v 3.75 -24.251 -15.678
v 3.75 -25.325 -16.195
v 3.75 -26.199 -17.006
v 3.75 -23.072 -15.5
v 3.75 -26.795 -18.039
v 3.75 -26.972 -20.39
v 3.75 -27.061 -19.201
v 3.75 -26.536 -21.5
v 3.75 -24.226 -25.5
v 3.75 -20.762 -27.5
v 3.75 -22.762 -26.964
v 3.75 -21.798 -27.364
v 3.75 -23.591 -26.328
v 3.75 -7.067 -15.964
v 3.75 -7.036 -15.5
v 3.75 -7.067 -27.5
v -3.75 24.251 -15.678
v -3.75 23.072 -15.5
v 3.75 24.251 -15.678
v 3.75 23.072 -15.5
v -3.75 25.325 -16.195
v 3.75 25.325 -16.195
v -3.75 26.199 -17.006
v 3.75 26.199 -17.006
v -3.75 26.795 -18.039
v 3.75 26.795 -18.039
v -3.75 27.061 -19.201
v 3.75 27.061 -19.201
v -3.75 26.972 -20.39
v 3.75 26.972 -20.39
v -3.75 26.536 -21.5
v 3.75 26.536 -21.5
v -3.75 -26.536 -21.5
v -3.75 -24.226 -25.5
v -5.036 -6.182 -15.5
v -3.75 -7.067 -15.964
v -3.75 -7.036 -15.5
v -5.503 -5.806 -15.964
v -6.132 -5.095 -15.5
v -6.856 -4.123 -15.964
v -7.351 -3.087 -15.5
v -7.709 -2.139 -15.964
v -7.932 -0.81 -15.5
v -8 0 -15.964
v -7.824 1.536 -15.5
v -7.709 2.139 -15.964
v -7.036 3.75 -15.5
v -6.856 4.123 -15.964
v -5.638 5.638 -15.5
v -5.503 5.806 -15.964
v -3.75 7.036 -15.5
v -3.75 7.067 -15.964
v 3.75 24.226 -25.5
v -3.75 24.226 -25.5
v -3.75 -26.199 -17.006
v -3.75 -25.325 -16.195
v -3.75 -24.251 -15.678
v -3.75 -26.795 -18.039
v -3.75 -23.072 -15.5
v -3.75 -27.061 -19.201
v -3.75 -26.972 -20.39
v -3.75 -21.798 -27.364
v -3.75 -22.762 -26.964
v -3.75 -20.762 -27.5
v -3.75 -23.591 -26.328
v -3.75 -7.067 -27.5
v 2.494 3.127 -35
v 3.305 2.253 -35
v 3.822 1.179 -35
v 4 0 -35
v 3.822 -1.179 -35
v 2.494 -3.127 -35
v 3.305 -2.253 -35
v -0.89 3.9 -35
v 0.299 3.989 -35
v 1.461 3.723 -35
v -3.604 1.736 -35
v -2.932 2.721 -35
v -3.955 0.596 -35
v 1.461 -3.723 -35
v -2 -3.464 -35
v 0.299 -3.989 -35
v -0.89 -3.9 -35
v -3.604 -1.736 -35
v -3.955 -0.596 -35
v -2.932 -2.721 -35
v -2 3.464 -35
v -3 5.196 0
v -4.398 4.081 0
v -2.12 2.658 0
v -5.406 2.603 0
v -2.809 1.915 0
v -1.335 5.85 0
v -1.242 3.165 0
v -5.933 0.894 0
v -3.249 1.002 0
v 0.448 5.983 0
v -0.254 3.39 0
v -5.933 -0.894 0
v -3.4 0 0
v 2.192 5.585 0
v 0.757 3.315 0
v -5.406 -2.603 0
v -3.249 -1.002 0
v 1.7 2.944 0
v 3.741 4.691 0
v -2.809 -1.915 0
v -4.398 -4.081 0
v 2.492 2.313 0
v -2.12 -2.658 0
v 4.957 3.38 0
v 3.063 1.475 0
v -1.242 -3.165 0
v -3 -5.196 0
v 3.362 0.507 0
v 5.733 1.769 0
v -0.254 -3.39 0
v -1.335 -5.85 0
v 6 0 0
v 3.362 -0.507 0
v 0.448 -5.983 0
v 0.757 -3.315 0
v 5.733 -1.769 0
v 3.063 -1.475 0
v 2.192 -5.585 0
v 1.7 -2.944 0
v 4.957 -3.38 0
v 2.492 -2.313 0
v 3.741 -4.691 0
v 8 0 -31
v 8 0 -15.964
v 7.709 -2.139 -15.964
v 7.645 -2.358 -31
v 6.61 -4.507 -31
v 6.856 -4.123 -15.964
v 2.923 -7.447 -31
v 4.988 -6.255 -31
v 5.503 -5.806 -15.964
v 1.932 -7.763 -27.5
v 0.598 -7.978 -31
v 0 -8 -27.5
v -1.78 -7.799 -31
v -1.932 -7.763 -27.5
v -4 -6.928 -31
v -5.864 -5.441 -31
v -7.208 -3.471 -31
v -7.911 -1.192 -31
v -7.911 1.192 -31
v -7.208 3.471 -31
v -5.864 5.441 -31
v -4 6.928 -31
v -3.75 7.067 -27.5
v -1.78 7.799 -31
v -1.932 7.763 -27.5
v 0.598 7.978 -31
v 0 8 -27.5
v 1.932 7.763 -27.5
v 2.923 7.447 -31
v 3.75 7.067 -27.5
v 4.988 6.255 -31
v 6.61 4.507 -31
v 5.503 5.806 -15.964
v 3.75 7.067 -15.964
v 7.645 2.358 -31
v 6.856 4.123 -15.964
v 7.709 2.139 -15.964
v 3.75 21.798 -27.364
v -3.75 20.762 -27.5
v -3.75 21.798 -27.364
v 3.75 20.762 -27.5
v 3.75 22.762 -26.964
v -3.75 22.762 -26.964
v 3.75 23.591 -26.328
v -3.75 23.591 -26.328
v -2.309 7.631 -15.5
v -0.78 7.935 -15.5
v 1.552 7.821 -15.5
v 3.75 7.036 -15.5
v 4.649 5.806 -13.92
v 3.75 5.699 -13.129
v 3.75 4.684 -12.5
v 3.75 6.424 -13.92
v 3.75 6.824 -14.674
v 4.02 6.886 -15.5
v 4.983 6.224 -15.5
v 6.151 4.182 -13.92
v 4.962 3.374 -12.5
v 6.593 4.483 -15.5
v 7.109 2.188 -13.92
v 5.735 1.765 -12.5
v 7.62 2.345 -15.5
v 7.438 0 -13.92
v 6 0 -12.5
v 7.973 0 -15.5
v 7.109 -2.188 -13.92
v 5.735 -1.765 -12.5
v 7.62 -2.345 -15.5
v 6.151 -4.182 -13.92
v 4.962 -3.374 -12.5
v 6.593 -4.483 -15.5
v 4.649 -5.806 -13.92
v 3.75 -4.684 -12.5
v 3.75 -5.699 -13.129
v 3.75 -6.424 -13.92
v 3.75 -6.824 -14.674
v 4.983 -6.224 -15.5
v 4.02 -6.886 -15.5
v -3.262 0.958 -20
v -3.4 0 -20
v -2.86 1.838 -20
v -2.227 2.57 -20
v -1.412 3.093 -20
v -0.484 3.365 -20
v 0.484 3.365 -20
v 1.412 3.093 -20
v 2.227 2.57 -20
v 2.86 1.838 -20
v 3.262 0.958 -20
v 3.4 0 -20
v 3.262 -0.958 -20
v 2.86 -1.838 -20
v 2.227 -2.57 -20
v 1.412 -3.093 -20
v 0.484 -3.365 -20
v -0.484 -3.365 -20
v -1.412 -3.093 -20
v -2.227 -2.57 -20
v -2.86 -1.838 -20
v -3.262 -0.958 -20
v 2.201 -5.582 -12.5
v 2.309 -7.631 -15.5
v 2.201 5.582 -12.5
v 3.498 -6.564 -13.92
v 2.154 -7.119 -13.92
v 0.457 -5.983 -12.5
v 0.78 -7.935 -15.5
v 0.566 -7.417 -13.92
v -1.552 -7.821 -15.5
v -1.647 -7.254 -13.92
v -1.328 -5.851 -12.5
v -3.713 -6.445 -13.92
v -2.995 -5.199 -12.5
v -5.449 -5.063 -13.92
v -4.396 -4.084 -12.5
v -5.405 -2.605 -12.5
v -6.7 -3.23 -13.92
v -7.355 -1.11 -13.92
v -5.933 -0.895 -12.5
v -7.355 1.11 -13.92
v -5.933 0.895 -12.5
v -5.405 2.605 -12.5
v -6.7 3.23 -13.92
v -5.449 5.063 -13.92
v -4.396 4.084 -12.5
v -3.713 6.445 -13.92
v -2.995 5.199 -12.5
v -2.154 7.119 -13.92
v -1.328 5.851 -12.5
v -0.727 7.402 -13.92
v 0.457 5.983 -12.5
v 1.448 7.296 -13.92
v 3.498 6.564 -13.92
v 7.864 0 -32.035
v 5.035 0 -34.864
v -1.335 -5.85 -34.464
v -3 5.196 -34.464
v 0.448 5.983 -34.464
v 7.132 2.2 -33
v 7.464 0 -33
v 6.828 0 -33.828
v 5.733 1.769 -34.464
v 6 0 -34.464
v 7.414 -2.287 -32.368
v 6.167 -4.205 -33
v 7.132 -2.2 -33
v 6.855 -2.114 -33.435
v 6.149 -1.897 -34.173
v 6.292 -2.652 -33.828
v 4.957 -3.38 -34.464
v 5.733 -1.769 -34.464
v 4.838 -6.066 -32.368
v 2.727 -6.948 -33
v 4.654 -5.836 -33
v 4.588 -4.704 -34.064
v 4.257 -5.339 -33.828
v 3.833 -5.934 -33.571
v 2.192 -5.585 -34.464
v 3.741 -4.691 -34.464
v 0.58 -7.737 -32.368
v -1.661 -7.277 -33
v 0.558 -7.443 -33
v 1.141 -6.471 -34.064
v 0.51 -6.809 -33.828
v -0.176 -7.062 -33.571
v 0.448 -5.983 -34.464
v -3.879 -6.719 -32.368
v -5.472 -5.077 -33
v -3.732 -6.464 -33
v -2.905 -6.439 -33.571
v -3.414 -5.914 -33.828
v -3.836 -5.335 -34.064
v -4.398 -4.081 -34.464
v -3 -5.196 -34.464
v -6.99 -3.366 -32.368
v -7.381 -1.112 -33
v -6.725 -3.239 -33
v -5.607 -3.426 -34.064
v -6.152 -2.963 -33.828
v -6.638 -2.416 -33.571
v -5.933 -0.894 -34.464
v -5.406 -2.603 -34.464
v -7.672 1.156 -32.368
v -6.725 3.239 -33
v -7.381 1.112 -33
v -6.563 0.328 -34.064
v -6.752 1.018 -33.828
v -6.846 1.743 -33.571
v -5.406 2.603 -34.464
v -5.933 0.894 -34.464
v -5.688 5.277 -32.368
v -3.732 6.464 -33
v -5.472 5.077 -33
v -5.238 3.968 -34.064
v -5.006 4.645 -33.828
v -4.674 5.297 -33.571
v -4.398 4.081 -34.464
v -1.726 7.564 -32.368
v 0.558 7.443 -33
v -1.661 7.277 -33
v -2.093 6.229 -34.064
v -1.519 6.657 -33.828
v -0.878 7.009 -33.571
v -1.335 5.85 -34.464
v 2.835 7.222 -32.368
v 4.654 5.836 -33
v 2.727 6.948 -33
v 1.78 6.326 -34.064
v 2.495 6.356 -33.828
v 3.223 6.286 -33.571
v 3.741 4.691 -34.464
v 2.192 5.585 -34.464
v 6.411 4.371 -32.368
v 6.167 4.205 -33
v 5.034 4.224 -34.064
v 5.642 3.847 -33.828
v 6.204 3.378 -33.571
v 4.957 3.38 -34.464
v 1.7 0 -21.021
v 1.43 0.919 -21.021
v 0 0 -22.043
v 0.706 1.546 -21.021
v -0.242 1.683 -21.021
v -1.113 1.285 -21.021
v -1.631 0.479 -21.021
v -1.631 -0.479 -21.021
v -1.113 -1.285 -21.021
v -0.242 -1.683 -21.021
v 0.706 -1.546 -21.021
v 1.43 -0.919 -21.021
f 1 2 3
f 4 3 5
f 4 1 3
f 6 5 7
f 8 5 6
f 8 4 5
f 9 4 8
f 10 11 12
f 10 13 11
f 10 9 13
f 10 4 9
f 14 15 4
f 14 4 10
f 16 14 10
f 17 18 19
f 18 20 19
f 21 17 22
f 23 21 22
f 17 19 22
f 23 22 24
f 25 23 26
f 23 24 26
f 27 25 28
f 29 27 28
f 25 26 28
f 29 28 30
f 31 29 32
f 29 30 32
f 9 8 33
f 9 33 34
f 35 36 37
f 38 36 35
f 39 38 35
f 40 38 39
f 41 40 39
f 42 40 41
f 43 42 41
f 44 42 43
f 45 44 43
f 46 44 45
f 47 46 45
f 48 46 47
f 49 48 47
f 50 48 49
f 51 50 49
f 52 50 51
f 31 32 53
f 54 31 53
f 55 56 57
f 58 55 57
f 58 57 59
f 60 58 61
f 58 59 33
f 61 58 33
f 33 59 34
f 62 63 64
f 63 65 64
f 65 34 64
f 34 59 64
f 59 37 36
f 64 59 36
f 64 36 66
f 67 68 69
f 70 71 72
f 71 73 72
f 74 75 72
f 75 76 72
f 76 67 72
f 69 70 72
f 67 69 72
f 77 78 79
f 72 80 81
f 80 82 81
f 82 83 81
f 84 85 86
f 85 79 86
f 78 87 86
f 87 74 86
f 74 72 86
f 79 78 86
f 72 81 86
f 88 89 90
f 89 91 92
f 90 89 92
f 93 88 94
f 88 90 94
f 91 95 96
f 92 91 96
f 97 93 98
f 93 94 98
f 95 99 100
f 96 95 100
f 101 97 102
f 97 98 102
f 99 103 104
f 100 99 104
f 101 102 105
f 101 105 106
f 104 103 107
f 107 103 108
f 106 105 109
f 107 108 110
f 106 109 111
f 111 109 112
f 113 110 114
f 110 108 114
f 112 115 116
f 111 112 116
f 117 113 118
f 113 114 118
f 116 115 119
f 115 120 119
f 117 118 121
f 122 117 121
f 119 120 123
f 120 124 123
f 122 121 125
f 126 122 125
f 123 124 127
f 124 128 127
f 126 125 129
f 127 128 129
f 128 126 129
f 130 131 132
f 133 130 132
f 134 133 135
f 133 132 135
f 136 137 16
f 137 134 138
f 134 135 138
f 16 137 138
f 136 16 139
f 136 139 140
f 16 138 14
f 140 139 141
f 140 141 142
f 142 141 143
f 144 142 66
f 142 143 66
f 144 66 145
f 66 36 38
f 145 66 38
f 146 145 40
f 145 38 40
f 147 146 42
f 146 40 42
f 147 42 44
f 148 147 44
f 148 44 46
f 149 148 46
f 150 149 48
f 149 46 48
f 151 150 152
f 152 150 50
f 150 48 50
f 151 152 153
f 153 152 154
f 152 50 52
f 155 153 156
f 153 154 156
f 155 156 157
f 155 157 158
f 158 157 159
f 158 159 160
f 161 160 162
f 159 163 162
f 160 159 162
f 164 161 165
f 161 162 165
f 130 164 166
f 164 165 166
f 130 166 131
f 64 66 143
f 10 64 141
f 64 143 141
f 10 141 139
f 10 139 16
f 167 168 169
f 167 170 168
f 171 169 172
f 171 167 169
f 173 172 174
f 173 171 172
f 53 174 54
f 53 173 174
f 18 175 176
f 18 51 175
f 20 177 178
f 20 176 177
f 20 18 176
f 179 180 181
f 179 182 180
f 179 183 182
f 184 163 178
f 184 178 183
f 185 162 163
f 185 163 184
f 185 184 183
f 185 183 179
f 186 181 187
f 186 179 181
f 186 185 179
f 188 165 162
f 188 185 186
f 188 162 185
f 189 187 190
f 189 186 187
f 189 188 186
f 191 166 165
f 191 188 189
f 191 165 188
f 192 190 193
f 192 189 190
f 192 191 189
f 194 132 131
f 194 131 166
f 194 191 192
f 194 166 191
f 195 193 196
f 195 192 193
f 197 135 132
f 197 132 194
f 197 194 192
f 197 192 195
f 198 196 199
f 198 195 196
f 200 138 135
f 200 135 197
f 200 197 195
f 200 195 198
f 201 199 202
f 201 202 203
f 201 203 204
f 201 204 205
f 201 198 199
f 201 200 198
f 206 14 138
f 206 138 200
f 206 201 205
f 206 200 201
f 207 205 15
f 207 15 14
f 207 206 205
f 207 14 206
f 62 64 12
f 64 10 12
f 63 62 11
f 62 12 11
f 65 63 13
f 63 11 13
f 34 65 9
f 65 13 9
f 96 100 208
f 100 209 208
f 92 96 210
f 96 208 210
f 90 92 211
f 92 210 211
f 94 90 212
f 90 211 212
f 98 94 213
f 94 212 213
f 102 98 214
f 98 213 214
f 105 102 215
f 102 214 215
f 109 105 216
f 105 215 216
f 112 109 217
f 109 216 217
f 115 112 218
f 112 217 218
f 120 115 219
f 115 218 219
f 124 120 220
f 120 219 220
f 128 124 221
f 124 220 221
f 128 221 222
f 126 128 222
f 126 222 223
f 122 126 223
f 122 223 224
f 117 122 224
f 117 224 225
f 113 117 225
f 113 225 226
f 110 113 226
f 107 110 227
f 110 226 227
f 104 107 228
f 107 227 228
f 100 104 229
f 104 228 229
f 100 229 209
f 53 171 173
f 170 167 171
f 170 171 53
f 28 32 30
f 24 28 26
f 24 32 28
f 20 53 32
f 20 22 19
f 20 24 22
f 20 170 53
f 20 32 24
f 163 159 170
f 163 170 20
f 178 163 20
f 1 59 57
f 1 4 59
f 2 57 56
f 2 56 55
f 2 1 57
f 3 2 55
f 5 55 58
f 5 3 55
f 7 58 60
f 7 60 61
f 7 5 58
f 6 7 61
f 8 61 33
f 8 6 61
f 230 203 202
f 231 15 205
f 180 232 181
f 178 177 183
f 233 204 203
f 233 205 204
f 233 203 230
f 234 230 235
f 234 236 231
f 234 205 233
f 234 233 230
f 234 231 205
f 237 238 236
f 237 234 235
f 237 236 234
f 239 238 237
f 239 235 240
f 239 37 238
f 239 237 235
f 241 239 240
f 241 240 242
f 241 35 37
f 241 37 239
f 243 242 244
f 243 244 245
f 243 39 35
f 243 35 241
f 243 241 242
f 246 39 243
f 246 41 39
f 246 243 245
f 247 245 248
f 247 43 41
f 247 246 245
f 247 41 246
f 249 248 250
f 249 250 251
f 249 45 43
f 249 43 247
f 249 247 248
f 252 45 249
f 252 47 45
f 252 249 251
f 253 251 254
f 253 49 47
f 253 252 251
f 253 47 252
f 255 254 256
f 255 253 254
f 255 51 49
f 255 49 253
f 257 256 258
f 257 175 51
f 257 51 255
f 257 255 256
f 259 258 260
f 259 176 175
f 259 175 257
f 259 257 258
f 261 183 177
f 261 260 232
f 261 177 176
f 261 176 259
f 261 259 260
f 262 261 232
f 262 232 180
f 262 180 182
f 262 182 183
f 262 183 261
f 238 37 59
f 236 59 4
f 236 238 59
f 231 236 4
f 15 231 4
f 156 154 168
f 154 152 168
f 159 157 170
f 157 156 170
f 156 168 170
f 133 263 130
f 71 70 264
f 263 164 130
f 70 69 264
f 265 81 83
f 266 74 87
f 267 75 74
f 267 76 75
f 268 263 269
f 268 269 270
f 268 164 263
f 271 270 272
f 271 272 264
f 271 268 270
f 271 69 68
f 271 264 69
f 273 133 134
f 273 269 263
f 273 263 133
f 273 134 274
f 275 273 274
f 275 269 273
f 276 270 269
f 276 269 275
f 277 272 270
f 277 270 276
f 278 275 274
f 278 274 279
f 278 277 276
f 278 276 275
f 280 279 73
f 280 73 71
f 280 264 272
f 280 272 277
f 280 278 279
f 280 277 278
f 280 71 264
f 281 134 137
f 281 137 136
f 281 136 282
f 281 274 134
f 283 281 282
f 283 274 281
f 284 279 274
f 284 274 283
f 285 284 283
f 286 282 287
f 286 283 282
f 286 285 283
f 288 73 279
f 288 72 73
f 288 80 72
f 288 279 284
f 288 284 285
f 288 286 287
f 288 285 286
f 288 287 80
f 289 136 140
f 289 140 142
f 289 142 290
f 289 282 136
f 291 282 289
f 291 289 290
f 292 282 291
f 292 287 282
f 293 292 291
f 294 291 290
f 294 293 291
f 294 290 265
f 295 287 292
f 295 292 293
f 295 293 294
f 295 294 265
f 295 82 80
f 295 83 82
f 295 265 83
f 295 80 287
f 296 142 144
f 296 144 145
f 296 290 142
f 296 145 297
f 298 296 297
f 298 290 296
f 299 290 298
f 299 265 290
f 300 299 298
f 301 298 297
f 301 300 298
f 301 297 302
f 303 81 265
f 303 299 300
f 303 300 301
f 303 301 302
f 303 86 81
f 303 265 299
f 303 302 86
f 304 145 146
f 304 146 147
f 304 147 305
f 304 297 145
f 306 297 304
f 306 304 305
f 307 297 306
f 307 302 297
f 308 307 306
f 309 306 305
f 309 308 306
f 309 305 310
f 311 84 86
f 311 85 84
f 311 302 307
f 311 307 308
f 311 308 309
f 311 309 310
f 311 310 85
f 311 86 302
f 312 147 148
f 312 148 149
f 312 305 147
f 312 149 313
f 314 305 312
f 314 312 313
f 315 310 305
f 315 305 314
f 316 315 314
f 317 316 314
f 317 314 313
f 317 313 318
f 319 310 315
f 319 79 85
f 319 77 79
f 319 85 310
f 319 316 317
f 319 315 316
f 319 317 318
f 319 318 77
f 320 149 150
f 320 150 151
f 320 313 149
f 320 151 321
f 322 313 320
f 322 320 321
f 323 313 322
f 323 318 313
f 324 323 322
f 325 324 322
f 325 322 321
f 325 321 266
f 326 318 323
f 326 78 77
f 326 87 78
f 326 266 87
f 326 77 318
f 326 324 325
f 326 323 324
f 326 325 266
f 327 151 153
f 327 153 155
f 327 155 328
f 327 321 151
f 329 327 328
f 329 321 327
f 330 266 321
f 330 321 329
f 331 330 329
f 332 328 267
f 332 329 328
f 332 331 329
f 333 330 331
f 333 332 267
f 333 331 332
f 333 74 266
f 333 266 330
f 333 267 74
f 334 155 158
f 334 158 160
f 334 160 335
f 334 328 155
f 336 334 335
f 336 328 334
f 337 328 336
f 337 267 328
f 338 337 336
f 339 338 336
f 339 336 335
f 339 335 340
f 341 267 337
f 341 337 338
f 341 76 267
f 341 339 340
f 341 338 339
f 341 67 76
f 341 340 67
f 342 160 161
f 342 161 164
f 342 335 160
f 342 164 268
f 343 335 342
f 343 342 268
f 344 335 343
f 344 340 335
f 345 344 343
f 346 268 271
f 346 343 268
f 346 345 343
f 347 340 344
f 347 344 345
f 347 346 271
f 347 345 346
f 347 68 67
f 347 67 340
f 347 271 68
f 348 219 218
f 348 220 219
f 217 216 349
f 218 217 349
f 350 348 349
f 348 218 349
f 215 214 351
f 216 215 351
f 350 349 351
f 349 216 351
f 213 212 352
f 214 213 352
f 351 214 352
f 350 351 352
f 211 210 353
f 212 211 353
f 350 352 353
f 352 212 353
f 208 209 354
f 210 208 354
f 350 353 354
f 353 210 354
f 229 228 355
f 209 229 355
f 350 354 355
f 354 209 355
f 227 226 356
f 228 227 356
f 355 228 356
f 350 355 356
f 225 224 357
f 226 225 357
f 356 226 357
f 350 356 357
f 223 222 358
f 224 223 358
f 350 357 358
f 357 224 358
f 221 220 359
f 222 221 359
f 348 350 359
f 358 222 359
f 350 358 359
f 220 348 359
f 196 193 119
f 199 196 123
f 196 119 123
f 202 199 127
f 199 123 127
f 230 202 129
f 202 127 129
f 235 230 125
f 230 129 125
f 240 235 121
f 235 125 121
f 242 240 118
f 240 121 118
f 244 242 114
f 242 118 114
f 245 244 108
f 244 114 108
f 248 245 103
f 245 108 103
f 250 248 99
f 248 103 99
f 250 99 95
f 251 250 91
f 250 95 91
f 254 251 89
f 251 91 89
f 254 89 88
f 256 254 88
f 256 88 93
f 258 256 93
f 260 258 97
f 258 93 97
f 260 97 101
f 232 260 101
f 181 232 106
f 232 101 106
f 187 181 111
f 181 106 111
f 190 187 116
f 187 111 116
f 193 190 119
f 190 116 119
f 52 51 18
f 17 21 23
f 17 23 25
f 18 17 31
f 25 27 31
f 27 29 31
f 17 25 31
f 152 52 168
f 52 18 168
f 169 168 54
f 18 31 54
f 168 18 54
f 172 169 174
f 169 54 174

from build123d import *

# Parameters (mm, degrees)
SKETCH4_W               = 7.5
SKETCH4_H               = 12
BOSS_EXTRUDE2_DEPTH     = 30
CUT_EXTRUDE1_DEPTH      = 48.571656477
CUT_EXTRUDE1_DEPTH_BACK = 48.571656477
CUT_EXTRUDE2_DEPTH      = 48.571656477
CUT_EXTRUDE2_DEPTH_BACK = 48.571656477
M8_TAPPED_HOLE2_D       = 6.8
M8_TAPPED_HOLE2_DEPTH   = 20
M8_TAPPED_HOLE2_TIP     = 2.042926105
FILLET1_R               = 4
FILLET2_R               = 4


with BuildPart() as part:
    # Sketch2 → Revolve1 (revolve)
    with BuildSketch(Plane(origin=(0, 0, 0), x_dir=(1, 0, 0), z_dir=(0, 1, 0)), mode=Mode.PRIVATE) as revolve1_sk:
        Polygon((-6, 0), (0, 0), (0, 35), (-8, 35), (-8, 27.5), (-8, 15.5), (-8, 12.5), (-6, 12.5), align=None)
    revolve(revolve1_sk.sketch.rotate(Axis((0, 0, 0), (0, 0, -1)), 180), axis=Axis((0, 0, 0), (0, 0, -1)))

    # Sketch4 → Boss-Extrude2 (add, symmetric)
    with BuildSketch(Plane(origin=(0, 0, 0), x_dir=(1, 0, 0), z_dir=(0, 1, 0))):
        with Locations((0, 21.5)):
            Rectangle(SKETCH4_W, SKETCH4_H)
    extrude(amount=BOSS_EXTRUDE2_DEPTH, both=True)

    # Sketch5 → Cut-Extrude1 (cut, two sides: drawn at the far end of the back side and taken through both)
    with BuildSketch(Plane(origin=(3.75, 0, 0), x_dir=(0, 0, -1), z_dir=(1, 0, 0)).offset(-CUT_EXTRUDE1_DEPTH_BACK)):
        Polygon((15.5, 30), (27.5, 23.07179677), (27.5, 30), align=None)
    extrude(amount=CUT_EXTRUDE1_DEPTH + CUT_EXTRUDE1_DEPTH_BACK, mode=Mode.SUBTRACT)

    # Sketch6 → Cut-Extrude2 (cut, two sides: drawn at the far end of the back side and taken through both)
    with BuildSketch(Plane(origin=(3.75, 0, 0), x_dir=(0, 0, -1), z_dir=(1, 0, 0)).offset(-CUT_EXTRUDE2_DEPTH_BACK)):
        Polygon((15.5, -30), (27.5, -23.07179677), (27.5, -30), align=None)
    extrude(amount=CUT_EXTRUDE2_DEPTH + CUT_EXTRUDE2_DEPTH_BACK, mode=Mode.SUBTRACT)

    # M8 Tapped Hole2
    with Locations(Plane.XY):
        with Locations((0, 0)):
            Hole(M8_TAPPED_HOLE2_D / 2, depth=M8_TAPPED_HOLE2_DEPTH)
            with Locations((0, 0, -(M8_TAPPED_HOLE2_DEPTH + M8_TAPPED_HOLE2_TIP / 2))):  # 118° drill point
                Cone(0, M8_TAPPED_HOLE2_D / 2, M8_TAPPED_HOLE2_TIP, mode=Mode.SUBTRACT)

    # Fillet1
    fillet1_edges = [part.edges().sort_by_distance(p)[0] for p in [
        (0, -30, -15.5),
        (0, 30, -15.5),
        (0, 23.07179677, -27.5),
        (0, -23.07179677, -27.5),
    ]]
    fillet(fillet1_edges, radius=FILLET1_R)

    # Fillet2
    # the kernel refuses this fillet: 4 mm, written as the material it takes off along each edge
    with BuildSketch(Plane(origin=(0, 0, -35), x_dir=(1, 0, 0), z_dir=(0, 1, 0))) as fillet2_piece_1:
        with BuildLine():
            CenterArc((8 - FILLET2_R, -FILLET2_R), FILLET2_R, 0, 90)
            Line((8 - FILLET2_R, 0), (8, 0))
            Line((8, 0), (8, -FILLET2_R))
        make_face()
    revolve(axis=Axis((0, 0, -35), (0, 0, -1)), mode=Mode.SUBTRACT)
    with BuildSketch(Plane(origin=(0, 0, -12.5), x_dir=(1, 0, 0), z_dir=(0, 1, 0))) as fillet2_piece_2_section:
        with BuildLine():
            CenterArc((4, 3.464101615), FILLET2_R, 300, 60)
            Line((6, 0), (8, 0))
            Line((8, 0), (8, 3.464101615))
        make_face()
    fillet2_piece_2 = revolve(axis=Axis((0, 0, -12.5), (0, 0, -1)), mode=Mode.PRIVATE)
    fillet2_piece_2 = split(fillet2_piece_2, bisect_by=Plane(origin=(3.75, -4.120033491, -15.73161152), z_dir=(1, 0, 0)), keep=Keep.TOP, mode=Mode.PRIVATE)
    add(fillet2_piece_2, mode=Mode.SUBTRACT)
    with BuildSketch(Plane(origin=(0, 0, -12.5), x_dir=(1, 0, 0), z_dir=(0, 1, 0))) as fillet2_piece_3_section:
        with BuildLine():
            CenterArc((4, 3.464101615), FILLET2_R, 300, 60)
            Line((6, 0), (8, 0))
            Line((8, 0), (8, 3.464101615))
        make_face()
    fillet2_piece_3 = revolve(axis=Axis((0, 0, -12.5), (0, 0, -1)), mode=Mode.PRIVATE)
    fillet2_piece_3 = split(fillet2_piece_3, bisect_by=Plane(origin=(0, -7.348709995, -15.5), z_dir=(0, 0, 1)), keep=Keep.TOP, mode=Mode.PRIVATE)
    add(fillet2_piece_3, mode=Mode.SUBTRACT)
    with BuildSketch(Plane(origin=(0, 0, -12.5), x_dir=(1, 0, 0), z_dir=(0, 1, 0))) as fillet2_piece_4_section:
        with BuildLine():
            CenterArc((4, 3.464101615), FILLET2_R, 300, 60)
            Line((6, 0), (8, 0))
            Line((8, 0), (8, 3.464101615))
        make_face()
    fillet2_piece_4 = revolve(axis=Axis((0, 0, -12.5), (0, 0, -1)), mode=Mode.PRIVATE)
    fillet2_piece_4 = split(fillet2_piece_4, bisect_by=Plane(origin=(-3.75, 0, -15.73161152), z_dir=(-1, 0, 0)), keep=Keep.TOP, mode=Mode.PRIVATE)
    add(fillet2_piece_4, mode=Mode.SUBTRACT)


solid = part.part
